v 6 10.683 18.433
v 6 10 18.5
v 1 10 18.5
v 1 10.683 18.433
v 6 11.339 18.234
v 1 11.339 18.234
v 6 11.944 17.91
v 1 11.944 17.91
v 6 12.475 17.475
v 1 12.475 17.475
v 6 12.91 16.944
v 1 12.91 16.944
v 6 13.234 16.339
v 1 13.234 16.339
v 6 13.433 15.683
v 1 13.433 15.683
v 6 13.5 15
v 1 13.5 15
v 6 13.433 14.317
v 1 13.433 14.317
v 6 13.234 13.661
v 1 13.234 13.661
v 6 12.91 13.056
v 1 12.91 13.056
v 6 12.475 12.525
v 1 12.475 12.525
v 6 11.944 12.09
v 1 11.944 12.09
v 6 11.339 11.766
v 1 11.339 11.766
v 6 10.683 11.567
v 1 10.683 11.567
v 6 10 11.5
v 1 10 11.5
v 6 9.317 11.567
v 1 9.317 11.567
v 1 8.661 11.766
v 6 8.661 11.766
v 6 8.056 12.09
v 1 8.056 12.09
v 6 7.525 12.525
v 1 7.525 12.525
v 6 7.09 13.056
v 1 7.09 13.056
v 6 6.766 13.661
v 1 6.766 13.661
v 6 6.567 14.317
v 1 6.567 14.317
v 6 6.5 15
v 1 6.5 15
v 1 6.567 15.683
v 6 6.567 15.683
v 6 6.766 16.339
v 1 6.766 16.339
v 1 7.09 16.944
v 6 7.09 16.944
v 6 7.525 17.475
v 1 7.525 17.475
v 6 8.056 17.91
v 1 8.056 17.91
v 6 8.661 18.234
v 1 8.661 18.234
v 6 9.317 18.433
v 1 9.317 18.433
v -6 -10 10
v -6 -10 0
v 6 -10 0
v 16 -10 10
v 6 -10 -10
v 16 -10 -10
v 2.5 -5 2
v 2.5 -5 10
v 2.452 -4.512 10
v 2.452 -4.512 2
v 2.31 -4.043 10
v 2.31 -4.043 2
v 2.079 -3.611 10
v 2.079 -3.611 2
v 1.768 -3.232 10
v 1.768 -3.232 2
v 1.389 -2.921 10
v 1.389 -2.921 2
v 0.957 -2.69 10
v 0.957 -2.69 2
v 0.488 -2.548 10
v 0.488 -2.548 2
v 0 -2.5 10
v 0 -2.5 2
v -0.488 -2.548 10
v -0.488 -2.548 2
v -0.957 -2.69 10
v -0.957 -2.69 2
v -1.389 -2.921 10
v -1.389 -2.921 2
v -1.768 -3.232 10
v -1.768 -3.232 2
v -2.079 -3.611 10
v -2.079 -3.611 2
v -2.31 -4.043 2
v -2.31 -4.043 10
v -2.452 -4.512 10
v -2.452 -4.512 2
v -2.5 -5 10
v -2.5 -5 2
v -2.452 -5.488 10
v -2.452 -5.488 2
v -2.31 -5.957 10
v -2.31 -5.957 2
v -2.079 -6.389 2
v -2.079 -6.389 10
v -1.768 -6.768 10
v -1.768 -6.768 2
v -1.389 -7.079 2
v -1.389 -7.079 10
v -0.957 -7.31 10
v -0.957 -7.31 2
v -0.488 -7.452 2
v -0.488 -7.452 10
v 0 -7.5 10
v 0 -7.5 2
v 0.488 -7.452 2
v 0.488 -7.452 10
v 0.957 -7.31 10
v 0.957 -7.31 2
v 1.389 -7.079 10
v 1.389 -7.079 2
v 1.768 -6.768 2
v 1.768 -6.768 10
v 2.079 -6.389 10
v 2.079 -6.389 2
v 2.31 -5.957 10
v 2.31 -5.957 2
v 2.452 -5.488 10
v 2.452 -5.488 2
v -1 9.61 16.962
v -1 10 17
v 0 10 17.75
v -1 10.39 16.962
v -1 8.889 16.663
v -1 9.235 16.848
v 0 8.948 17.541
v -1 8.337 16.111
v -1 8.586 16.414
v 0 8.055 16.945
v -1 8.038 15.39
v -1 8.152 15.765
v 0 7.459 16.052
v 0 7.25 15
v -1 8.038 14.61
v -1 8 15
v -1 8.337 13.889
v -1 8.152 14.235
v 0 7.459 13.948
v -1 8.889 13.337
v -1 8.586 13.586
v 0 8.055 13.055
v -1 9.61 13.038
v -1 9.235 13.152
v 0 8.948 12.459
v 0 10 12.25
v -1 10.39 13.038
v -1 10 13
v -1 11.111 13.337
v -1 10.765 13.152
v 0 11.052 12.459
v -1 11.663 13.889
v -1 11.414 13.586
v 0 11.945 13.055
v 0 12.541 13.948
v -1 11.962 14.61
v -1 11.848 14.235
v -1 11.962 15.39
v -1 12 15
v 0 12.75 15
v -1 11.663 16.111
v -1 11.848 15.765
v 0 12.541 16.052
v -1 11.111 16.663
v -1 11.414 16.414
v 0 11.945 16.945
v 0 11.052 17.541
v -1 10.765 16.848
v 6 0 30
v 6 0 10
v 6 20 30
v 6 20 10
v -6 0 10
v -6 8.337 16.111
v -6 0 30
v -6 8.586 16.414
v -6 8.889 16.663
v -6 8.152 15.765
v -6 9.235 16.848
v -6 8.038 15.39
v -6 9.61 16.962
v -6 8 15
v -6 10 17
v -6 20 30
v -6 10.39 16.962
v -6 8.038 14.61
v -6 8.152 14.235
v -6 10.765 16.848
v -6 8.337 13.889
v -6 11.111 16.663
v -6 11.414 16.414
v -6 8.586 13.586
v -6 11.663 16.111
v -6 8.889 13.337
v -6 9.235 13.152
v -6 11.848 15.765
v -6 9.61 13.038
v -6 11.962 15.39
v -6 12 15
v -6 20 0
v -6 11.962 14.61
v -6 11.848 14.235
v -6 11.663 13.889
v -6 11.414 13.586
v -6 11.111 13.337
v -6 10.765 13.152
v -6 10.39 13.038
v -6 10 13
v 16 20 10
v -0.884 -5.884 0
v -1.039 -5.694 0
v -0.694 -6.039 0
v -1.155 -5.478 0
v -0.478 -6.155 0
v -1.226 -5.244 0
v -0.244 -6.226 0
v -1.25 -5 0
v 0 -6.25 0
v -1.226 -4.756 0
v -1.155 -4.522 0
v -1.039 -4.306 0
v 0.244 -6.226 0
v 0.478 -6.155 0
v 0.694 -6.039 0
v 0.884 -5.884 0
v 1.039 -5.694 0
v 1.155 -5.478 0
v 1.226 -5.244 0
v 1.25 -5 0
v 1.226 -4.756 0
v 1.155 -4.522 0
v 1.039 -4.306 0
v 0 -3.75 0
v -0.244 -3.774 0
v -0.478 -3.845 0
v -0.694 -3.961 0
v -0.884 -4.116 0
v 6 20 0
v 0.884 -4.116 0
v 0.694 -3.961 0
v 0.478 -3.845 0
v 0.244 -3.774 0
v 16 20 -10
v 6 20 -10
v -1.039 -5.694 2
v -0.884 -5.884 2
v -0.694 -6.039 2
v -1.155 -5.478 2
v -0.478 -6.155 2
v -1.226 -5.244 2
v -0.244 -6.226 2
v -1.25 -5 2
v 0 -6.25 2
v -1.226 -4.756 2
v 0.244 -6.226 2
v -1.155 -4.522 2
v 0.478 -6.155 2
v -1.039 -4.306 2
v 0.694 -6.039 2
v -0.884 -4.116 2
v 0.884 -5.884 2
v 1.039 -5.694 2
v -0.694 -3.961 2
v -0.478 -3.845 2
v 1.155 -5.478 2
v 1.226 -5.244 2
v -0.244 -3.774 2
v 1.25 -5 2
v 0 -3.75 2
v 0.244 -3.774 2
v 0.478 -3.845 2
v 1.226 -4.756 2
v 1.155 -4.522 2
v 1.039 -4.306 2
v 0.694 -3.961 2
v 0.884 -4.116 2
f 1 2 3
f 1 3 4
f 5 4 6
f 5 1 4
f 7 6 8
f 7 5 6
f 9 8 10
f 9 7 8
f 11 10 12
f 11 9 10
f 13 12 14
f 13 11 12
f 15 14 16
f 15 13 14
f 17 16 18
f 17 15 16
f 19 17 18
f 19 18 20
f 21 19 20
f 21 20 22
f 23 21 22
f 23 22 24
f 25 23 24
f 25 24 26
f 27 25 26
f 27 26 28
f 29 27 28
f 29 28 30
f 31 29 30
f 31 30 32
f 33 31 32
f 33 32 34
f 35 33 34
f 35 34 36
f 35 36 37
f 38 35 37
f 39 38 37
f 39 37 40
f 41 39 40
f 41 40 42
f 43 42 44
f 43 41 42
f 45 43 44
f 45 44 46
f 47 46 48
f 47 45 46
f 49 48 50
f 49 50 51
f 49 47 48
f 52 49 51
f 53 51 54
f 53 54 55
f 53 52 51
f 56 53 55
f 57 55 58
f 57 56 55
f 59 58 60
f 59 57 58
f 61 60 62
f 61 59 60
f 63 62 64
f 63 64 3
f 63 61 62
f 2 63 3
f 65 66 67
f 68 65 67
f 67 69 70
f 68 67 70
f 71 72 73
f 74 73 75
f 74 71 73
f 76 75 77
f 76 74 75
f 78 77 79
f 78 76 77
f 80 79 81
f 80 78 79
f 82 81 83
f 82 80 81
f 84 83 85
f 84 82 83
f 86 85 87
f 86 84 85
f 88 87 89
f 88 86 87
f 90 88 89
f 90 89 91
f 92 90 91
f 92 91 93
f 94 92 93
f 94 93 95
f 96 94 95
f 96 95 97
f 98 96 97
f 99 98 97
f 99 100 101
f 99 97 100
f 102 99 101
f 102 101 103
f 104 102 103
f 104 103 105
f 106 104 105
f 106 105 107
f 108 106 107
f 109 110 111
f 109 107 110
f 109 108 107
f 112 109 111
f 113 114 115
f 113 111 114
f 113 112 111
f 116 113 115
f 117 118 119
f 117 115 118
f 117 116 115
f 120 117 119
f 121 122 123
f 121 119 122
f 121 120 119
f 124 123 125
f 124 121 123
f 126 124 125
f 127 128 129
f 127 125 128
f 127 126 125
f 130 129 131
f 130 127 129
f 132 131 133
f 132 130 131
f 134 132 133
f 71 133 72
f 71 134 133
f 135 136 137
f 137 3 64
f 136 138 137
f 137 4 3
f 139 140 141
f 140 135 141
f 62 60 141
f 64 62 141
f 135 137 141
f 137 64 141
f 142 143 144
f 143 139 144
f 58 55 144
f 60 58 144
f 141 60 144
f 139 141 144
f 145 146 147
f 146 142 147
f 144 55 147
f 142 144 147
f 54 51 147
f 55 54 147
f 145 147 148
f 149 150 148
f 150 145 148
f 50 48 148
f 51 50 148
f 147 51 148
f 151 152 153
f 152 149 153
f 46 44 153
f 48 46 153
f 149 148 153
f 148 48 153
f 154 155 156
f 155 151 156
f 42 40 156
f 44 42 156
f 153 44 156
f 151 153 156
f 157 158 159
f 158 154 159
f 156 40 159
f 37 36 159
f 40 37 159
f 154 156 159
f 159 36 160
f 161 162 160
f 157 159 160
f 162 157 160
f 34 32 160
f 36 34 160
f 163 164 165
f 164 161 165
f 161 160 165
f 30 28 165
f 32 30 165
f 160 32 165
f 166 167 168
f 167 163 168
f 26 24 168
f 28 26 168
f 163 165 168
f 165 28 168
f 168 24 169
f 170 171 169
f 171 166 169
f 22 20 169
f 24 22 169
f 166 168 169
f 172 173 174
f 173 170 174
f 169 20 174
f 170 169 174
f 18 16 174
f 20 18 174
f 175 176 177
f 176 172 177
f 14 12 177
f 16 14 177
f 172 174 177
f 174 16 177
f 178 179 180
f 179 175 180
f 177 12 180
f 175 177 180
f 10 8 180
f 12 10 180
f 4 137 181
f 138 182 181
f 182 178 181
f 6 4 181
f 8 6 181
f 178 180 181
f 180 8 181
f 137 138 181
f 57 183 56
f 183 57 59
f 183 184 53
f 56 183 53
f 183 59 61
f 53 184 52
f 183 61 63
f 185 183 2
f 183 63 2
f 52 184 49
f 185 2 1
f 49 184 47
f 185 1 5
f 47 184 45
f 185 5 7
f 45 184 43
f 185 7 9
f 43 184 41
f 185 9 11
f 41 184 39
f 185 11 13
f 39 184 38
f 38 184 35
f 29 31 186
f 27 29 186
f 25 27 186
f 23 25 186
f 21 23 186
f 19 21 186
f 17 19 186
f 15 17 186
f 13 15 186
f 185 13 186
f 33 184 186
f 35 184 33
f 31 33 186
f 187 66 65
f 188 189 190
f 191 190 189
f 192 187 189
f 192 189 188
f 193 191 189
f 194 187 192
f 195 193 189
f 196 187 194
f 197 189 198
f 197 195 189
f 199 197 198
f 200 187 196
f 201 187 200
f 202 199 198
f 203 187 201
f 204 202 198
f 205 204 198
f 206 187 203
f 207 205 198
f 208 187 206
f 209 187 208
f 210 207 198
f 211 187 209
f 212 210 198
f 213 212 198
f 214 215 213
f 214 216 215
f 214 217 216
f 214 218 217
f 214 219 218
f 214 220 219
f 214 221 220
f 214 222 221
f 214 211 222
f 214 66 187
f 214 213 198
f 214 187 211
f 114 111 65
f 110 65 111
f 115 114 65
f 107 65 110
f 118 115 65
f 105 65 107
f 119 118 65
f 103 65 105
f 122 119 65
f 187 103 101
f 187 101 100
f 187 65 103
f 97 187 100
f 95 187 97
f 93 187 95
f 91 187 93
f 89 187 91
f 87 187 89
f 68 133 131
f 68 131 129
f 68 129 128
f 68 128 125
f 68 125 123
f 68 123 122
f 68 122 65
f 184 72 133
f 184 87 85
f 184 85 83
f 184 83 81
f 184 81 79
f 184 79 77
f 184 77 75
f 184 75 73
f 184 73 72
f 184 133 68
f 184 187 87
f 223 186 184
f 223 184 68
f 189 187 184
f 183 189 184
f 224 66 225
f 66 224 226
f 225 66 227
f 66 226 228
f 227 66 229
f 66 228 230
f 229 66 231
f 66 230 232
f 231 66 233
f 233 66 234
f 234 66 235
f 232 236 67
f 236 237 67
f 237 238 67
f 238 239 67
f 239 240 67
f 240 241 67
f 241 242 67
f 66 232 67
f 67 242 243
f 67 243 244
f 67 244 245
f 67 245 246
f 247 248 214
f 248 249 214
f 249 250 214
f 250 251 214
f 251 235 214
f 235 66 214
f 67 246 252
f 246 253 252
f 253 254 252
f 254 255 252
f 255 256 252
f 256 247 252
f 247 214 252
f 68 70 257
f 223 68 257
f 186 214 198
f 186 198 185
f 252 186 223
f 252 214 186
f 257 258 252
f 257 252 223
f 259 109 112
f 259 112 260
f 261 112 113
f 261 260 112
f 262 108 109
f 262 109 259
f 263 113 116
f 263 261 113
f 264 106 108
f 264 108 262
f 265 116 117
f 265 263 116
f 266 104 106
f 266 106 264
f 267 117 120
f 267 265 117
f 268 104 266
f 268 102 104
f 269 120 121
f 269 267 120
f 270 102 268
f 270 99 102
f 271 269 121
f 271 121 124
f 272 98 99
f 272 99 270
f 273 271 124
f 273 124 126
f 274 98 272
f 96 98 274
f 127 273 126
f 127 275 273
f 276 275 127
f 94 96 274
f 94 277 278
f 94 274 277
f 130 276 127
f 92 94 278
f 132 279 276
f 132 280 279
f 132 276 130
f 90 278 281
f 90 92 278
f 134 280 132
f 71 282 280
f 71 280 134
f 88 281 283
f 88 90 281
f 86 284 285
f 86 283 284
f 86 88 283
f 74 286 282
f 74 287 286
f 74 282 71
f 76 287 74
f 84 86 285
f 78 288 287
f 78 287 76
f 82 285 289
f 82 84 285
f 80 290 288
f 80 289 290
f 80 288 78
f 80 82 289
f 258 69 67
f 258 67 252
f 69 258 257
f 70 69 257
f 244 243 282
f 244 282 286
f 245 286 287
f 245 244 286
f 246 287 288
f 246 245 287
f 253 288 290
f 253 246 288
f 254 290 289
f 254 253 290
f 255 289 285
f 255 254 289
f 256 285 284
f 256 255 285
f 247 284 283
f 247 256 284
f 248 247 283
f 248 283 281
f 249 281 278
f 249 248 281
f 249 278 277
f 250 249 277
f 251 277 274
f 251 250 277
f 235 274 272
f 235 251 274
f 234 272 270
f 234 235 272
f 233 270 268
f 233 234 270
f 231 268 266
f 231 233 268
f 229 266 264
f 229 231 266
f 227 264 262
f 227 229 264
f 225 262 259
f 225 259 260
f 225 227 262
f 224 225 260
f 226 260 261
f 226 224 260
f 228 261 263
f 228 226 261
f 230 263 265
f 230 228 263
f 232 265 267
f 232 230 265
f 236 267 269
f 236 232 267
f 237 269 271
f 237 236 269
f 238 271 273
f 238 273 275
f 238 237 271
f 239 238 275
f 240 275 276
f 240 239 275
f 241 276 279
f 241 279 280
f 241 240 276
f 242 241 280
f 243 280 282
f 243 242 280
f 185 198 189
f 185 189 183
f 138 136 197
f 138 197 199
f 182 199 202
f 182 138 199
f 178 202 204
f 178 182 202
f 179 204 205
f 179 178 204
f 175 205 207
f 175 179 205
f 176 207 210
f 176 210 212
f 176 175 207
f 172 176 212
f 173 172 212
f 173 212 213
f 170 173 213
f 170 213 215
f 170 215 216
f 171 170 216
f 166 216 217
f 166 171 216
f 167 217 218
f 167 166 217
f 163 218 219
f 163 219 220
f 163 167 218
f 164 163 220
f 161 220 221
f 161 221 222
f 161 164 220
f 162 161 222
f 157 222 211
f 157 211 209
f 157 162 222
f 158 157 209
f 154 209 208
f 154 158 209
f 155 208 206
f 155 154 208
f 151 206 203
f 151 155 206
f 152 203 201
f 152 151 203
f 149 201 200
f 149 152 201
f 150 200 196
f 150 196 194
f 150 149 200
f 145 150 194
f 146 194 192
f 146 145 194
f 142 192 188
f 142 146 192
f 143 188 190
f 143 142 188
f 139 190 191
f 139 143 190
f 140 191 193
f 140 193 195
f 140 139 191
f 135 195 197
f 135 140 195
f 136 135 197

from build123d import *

# Parameters (mm, degrees)
CYLINDER001_R      = 2.5
CYLINDER001_DEPTH  = 10
CYLINDER_R         = 1.25
CYLINDER_DEPTH     = 2
CYLINDER003_R      = 3.5
CYLINDER003_DEPTH  = 20
CYLINDER002_R      = 2
CYLINDER002_DEPTH  = 5
FUSION_PITCH_ANGLE = -90
BOX002_W           = 12
BOX002_H           = 10
BOX002_DEPTH       = 20
BOX001_W           = 10
BOX001_H           = 30
BOX001_DEPTH       = 20
BOX_W              = 12
BOX_H              = 30
BOX_DEPTH          = 30


with BuildPart() as cylinder001:
    # Cylinder001 → Cylinder001 (new body)
    with BuildSketch(Plane(origin=(0, -3, 2), x_dir=(1, 0, 0), z_dir=(0, 0, 1))):
        Circle(CYLINDER001_R)
    extrude(amount=CYLINDER001_DEPTH)


with BuildPart() as fusion002:
    # Cylinder → Cylinder (new body)
    with BuildSketch(Plane(origin=(0, -3, 0), x_dir=(1, 0, 0), z_dir=(0, 0, 1))):
        Circle(CYLINDER_R)
    extrude(amount=CYLINDER_DEPTH)

    # Fusion002: union Cylinder001
    add(cylinder001.part)


with BuildPart() as fusion002_1:
    # Fusion002 placement: moved
    add(fusion002.part.moved(Location((0, -2, 0))))


with BuildPart() as cylinder003:
    # Cylinder003 → Cylinder003 (new body)
    with BuildSketch(Plane(origin=(15, -5, -17), x_dir=(1, 0, 0), z_dir=(0, 0, 1))):
        Circle(CYLINDER003_R)
    extrude(amount=CYLINDER003_DEPTH)


with BuildPart() as cone:
    # Cone → Cone (revolve)
    with BuildSketch(Plane(origin=(15, -5, 5), x_dir=(1, 0, 0), z_dir=(0, 1, 0))):
        Polygon((0, 0), (2, 0), (3.5, 2), (0, 2), align=None)
    revolve(axis=Axis((15, -5, 5), (0, 0, -1)))


with BuildPart() as fusion003:
    # Cylinder002 → Cylinder002 (new body)
    with BuildSketch(Plane(origin=(15, -5, 5), x_dir=(1, 0, 0), z_dir=(0, 0, 1))):
        Circle(CYLINDER002_R)
    extrude(amount=CYLINDER002_DEPTH)

    # Fusion: union Cylinder003, Cone
    add(cylinder003.part)
    add(cone.part)


with BuildPart() as fusion003_1:
    # Fusion pitch: moved
    add(fusion003.part.rotate(Axis((0, 0, 0), (0, 1, 0)), FUSION_PITCH_ANGLE))


with BuildPart() as fusion003_2:
    # Fusion placement: moved
    add(fusion003_1.part.moved(Location((4, 15, 0))))

    # Fusion003: union Fusion002
    add(fusion002_1.part)


with BuildPart() as cube002:
    # Box002 → Box002 (new body)
    with BuildSketch(Plane(origin=(-6, -10, 10), x_dir=(1, 0, 0), z_dir=(0, 0, 1))):
        with Locations((6, 5)):
            Rectangle(BOX002_W, BOX002_H)
    extrude(amount=BOX002_DEPTH)


with BuildPart() as cube001:
    # Box001 → Box001 (new body)
    with BuildSketch(Plane(origin=(6, -10, -10), x_dir=(1, 0, 0), z_dir=(0, 0, 1))):
        with Locations((5, 15)):
            Rectangle(BOX001_W, BOX001_H)
    extrude(amount=BOX001_DEPTH)


with BuildPart() as cut001:
    # Box → Box (new body)
    with BuildSketch(Plane(origin=(-6, -10, 0), x_dir=(1, 0, 0), z_dir=(0, 0, 1))):
        with Locations((6, 15)):
            Rectangle(BOX_W, BOX_H)
    extrude(amount=BOX_DEPTH)

    # Fusion001: union Cube001
    add(cube001.part)

    # Cut: cut Cube002
    add(cube002.part, mode=Mode.SUBTRACT)

    # Cut001: cut Fusion003
    add(fusion003_2.part, mode=Mode.SUBTRACT)


solid = cut001.part
